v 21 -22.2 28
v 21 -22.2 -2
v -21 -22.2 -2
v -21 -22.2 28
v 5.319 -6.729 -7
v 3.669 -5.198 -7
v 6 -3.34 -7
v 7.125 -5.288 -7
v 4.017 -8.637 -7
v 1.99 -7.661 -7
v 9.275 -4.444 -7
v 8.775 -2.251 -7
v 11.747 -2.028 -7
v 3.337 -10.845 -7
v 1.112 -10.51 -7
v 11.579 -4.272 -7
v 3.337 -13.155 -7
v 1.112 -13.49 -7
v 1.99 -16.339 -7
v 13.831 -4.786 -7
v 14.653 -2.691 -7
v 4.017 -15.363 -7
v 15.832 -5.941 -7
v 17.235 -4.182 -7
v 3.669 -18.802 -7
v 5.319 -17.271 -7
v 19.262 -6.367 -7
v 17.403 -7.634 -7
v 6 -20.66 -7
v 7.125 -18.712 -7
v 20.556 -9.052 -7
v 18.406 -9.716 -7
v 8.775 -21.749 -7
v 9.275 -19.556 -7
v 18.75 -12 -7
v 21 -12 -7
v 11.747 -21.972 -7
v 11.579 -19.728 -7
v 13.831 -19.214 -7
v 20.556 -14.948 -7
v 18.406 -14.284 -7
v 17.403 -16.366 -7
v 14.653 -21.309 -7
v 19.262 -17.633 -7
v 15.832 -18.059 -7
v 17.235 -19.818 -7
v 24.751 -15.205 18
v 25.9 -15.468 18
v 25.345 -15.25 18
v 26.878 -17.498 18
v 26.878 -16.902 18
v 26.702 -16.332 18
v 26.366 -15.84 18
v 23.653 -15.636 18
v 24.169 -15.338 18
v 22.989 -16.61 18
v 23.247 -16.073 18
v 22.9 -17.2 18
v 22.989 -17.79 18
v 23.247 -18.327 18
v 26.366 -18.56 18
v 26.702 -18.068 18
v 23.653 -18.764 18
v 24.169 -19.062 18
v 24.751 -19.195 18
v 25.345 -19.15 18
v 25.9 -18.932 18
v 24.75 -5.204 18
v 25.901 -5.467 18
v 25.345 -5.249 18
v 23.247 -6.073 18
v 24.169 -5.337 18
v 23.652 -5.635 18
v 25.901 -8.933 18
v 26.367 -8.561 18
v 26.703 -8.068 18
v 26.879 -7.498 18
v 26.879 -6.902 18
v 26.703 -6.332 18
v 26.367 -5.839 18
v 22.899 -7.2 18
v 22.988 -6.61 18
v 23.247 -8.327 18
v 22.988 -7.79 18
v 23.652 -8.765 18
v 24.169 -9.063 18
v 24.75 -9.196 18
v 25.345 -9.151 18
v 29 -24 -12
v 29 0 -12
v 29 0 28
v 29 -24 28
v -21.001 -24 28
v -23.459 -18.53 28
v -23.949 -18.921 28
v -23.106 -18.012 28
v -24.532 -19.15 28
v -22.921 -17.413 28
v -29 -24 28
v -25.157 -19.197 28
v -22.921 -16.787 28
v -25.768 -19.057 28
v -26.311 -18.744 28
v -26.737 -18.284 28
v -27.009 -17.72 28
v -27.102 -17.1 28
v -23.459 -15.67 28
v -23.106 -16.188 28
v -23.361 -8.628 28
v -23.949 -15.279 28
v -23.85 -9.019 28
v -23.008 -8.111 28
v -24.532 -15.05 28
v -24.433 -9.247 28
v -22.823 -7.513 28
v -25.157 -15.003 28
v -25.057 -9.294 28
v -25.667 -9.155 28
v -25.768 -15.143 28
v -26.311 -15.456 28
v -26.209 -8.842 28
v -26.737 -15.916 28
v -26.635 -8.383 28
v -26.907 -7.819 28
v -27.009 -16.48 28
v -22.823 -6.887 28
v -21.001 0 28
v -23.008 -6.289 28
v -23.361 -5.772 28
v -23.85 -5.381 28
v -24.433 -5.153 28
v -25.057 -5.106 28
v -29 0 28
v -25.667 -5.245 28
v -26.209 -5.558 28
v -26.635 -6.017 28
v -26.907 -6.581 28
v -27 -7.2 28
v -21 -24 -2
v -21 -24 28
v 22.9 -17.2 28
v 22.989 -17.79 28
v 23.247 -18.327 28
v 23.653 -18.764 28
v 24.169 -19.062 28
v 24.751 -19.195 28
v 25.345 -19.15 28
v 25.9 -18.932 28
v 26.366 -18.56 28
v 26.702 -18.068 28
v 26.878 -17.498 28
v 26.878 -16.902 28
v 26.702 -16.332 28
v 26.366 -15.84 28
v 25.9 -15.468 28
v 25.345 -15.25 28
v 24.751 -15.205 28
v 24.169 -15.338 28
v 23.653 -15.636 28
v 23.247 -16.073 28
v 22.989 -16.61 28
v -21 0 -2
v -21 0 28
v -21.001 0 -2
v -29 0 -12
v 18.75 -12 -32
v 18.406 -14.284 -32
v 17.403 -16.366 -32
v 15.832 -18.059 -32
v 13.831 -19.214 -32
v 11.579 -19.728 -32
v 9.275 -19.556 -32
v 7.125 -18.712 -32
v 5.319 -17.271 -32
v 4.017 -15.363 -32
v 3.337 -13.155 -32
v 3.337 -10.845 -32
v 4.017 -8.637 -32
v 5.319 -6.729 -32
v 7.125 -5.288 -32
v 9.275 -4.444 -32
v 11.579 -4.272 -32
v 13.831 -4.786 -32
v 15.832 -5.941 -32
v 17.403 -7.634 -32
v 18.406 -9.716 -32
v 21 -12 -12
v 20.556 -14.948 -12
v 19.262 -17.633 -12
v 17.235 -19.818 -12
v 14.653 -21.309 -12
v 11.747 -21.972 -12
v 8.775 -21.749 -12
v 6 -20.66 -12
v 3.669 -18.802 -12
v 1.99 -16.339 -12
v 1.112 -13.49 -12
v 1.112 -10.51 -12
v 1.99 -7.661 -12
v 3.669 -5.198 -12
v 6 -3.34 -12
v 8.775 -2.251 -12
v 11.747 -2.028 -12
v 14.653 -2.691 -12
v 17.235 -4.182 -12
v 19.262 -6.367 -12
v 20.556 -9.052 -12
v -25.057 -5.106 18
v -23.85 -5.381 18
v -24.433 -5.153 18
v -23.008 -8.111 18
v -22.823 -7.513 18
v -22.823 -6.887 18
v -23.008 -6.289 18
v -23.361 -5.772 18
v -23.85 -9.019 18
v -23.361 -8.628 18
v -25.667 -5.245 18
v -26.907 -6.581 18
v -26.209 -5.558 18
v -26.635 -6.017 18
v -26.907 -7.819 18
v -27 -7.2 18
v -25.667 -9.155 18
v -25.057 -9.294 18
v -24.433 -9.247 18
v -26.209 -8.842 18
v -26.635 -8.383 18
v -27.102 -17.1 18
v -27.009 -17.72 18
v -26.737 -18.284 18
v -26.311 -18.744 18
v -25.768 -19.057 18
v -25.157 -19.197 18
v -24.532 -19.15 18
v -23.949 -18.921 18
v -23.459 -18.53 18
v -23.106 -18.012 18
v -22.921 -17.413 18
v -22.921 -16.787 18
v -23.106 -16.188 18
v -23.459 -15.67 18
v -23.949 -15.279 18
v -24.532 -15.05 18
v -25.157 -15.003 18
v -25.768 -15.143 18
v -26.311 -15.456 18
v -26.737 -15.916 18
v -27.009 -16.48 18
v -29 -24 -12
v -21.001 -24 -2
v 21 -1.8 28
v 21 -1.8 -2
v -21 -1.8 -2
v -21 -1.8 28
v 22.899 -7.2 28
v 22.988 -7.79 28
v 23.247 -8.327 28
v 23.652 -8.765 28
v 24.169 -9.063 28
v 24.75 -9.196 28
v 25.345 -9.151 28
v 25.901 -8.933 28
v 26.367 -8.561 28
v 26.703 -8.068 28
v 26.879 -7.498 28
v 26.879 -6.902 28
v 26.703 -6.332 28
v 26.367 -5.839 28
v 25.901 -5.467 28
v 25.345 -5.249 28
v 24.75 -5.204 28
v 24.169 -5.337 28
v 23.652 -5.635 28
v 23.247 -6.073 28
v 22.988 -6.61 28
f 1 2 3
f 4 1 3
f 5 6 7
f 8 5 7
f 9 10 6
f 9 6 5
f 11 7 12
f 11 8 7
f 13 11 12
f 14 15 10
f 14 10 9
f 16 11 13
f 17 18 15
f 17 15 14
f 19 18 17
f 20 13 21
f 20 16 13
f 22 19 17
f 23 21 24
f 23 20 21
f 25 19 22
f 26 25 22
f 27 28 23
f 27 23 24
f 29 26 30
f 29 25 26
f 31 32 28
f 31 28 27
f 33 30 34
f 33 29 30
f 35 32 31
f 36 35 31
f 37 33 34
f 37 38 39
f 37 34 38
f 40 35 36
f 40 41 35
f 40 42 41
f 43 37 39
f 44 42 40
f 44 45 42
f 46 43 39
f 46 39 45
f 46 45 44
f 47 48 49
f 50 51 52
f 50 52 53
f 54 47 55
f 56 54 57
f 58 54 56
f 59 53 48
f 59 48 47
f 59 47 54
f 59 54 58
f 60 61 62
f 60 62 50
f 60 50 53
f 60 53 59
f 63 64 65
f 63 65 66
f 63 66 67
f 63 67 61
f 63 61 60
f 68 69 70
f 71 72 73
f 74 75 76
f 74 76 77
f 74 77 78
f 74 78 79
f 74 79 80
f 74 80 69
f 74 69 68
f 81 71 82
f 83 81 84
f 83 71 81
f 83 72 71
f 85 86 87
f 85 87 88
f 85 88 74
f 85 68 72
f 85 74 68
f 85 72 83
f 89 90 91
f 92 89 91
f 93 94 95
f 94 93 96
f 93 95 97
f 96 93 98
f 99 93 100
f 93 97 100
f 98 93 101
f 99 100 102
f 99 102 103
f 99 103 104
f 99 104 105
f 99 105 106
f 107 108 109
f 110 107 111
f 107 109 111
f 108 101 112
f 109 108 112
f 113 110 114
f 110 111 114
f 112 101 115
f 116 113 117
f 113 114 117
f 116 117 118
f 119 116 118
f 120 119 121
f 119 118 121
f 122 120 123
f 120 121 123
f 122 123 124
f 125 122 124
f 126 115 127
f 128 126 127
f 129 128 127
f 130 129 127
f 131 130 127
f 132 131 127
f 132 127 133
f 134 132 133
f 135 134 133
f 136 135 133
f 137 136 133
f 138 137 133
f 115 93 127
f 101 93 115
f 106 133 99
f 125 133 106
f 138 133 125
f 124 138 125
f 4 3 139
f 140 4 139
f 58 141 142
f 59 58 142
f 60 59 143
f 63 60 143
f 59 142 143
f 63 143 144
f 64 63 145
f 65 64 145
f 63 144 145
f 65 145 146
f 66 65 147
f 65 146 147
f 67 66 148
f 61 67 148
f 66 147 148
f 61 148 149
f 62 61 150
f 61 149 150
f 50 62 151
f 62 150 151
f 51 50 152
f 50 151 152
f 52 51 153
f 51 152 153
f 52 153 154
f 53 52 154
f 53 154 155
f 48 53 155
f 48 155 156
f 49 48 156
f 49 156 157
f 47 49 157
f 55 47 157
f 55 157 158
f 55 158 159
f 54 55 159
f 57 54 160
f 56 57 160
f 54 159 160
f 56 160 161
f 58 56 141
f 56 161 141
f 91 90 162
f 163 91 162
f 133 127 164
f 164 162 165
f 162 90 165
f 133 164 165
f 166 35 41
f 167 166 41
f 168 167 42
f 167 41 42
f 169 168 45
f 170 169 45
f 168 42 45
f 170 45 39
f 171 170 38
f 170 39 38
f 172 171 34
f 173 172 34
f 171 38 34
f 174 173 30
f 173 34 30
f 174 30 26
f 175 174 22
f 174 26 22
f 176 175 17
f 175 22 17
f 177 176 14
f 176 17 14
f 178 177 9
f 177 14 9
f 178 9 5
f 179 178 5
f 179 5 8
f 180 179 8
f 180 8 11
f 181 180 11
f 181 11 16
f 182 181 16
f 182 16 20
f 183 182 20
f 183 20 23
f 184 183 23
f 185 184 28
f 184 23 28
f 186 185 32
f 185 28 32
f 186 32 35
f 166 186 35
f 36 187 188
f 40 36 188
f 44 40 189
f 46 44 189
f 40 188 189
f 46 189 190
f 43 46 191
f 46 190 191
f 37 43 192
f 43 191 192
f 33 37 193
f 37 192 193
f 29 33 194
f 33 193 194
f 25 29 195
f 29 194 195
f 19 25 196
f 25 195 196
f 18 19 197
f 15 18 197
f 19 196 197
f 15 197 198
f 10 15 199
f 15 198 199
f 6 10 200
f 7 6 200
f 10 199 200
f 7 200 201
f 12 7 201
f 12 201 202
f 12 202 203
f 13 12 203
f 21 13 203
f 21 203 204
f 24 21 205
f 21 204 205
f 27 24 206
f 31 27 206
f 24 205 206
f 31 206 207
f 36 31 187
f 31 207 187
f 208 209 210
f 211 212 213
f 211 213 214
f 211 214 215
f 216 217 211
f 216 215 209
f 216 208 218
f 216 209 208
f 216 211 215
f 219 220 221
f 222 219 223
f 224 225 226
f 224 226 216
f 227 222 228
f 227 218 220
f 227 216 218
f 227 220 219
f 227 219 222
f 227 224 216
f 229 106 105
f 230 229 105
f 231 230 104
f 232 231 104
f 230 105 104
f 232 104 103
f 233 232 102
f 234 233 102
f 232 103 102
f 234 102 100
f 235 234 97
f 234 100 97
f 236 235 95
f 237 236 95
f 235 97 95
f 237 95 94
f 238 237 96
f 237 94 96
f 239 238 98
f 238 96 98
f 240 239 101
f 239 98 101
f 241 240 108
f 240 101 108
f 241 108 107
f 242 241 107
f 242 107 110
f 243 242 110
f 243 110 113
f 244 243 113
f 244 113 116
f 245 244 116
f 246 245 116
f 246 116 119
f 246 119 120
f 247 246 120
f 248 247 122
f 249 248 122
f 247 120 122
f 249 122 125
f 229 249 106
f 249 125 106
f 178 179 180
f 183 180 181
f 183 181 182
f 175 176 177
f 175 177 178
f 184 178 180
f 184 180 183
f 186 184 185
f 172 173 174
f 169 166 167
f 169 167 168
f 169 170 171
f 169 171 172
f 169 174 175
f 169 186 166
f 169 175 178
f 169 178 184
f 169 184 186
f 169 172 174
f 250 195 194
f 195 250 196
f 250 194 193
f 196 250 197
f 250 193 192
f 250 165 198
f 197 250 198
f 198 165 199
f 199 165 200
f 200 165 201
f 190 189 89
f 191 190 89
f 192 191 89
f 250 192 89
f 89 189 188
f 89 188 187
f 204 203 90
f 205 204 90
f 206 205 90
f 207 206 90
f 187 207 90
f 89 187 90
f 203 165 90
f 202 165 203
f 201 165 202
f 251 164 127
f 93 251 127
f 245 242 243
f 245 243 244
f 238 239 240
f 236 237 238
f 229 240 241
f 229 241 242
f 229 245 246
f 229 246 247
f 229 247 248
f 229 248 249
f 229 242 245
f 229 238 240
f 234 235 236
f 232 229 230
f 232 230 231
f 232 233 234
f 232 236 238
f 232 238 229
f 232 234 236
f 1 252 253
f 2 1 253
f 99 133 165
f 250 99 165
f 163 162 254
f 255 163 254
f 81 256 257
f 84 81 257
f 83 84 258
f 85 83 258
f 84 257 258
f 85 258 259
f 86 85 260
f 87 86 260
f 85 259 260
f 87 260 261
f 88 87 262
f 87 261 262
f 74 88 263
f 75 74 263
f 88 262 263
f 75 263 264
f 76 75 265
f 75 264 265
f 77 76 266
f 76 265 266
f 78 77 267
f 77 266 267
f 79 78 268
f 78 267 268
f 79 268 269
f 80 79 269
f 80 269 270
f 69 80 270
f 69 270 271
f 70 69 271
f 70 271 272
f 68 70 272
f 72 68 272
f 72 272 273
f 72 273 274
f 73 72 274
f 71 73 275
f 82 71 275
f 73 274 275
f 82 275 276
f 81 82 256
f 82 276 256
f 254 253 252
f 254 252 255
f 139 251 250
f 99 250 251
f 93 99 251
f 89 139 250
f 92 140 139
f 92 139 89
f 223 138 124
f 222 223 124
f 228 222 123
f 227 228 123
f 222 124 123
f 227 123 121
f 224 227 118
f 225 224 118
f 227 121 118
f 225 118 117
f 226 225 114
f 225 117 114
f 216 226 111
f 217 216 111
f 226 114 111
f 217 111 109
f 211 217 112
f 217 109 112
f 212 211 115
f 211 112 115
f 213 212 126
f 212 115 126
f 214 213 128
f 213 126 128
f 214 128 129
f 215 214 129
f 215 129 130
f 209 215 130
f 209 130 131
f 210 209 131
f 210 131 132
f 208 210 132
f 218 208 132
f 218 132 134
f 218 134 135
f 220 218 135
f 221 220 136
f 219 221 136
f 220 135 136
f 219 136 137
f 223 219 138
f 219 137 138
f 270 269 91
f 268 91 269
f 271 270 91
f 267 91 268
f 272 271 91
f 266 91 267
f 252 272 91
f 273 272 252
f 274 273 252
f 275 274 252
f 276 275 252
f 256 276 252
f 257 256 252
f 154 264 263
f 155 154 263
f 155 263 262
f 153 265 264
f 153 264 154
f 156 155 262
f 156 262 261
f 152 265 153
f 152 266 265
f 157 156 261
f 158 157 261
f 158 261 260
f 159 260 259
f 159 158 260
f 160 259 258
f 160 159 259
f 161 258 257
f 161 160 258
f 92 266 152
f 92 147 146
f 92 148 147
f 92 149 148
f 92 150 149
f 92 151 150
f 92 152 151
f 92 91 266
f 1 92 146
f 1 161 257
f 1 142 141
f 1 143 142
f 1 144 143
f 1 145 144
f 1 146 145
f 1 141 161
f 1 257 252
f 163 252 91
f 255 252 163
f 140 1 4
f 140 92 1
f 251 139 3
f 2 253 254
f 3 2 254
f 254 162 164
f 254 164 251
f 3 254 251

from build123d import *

# Parameters (mm, degrees)
PAD_DEPTH       = 24
SKETCH003_W     = 42
SKETCH003_H     = 1.8
PAD002_DEPTH    = 30
SKETCH001_R     = 10
POCKET_DEPTH    = 5
SKETCH004_R     = 7.75
PAD003_DEPTH    = 25
SKETCH005_R     = 2.000122
SKETCH005_R_2   = 2.001214
SKETCH005_R_3   = 2.1
SKETCH005_R_4   = 2.10238
POCKET001_DEPTH = 10


with BuildPart() as part:
    # Sketch → Pad (new body)
    with BuildSketch(Plane.XZ):
        Polygon((-21.000973, 28), (-29, 28), (-29, -2), (-29, -12), (29, -12), (29, 28), (21, 28), (21, -2), (-21.000973, -2), align=None)
    extrude(amount=PAD_DEPTH)

    # Sketch003 → Pad002 (join)
    with BuildSketch(Plane(origin=(0, 0, -2), x_dir=(-1, 0, 0), z_dir=(0, 0, 1))):
        with Locations((0, 0.9)):
            Rectangle(SKETCH003_W, SKETCH003_H)
        with Locations((0, 23.1)):
            Rectangle(SKETCH003_W, SKETCH003_H)
    extrude(amount=PAD002_DEPTH)

    # Sketch001 (on Face5 of Pad) → Pocket (cut)
    with BuildSketch(Plane(origin=(0, 0, -12), x_dir=(1, 0, 0), z_dir=(0, 0, -1))):
        with Locations((11, 12)):
            Circle(SKETCH001_R)
    extrude(amount=-POCKET_DEPTH, mode=Mode.SUBTRACT)

    # Sketch004 (on Face21 of Pocket) → Pad003 (join)
    with BuildSketch(Plane(origin=(0, 0, -7), x_dir=(1, 0, 0), z_dir=(0, 0, -1))):
        with Locations((11, 12)):
            Circle(SKETCH004_R)
    extrude(amount=PAD003_DEPTH)

    # Sketch005 (on Face15 of Pad003) → Pocket001 (cut)
    with BuildSketch(Plane(origin=(0, 0, 28), x_dir=(-1, 0, 0), z_dir=(0, 0, 1))):
        with Locations((-24.9, 17.2)):
            Circle(SKETCH005_R)
        with Locations((-24.9, 7.2)):
            Circle(SKETCH005_R_2)
        with Locations((24.9, 7.2)):
            Circle(SKETCH005_R_3)
        with Locations((25, 17.1)):
            Circle(SKETCH005_R_4)
    extrude(amount=-POCKET001_DEPTH, mode=Mode.SUBTRACT)


solid = part.part
